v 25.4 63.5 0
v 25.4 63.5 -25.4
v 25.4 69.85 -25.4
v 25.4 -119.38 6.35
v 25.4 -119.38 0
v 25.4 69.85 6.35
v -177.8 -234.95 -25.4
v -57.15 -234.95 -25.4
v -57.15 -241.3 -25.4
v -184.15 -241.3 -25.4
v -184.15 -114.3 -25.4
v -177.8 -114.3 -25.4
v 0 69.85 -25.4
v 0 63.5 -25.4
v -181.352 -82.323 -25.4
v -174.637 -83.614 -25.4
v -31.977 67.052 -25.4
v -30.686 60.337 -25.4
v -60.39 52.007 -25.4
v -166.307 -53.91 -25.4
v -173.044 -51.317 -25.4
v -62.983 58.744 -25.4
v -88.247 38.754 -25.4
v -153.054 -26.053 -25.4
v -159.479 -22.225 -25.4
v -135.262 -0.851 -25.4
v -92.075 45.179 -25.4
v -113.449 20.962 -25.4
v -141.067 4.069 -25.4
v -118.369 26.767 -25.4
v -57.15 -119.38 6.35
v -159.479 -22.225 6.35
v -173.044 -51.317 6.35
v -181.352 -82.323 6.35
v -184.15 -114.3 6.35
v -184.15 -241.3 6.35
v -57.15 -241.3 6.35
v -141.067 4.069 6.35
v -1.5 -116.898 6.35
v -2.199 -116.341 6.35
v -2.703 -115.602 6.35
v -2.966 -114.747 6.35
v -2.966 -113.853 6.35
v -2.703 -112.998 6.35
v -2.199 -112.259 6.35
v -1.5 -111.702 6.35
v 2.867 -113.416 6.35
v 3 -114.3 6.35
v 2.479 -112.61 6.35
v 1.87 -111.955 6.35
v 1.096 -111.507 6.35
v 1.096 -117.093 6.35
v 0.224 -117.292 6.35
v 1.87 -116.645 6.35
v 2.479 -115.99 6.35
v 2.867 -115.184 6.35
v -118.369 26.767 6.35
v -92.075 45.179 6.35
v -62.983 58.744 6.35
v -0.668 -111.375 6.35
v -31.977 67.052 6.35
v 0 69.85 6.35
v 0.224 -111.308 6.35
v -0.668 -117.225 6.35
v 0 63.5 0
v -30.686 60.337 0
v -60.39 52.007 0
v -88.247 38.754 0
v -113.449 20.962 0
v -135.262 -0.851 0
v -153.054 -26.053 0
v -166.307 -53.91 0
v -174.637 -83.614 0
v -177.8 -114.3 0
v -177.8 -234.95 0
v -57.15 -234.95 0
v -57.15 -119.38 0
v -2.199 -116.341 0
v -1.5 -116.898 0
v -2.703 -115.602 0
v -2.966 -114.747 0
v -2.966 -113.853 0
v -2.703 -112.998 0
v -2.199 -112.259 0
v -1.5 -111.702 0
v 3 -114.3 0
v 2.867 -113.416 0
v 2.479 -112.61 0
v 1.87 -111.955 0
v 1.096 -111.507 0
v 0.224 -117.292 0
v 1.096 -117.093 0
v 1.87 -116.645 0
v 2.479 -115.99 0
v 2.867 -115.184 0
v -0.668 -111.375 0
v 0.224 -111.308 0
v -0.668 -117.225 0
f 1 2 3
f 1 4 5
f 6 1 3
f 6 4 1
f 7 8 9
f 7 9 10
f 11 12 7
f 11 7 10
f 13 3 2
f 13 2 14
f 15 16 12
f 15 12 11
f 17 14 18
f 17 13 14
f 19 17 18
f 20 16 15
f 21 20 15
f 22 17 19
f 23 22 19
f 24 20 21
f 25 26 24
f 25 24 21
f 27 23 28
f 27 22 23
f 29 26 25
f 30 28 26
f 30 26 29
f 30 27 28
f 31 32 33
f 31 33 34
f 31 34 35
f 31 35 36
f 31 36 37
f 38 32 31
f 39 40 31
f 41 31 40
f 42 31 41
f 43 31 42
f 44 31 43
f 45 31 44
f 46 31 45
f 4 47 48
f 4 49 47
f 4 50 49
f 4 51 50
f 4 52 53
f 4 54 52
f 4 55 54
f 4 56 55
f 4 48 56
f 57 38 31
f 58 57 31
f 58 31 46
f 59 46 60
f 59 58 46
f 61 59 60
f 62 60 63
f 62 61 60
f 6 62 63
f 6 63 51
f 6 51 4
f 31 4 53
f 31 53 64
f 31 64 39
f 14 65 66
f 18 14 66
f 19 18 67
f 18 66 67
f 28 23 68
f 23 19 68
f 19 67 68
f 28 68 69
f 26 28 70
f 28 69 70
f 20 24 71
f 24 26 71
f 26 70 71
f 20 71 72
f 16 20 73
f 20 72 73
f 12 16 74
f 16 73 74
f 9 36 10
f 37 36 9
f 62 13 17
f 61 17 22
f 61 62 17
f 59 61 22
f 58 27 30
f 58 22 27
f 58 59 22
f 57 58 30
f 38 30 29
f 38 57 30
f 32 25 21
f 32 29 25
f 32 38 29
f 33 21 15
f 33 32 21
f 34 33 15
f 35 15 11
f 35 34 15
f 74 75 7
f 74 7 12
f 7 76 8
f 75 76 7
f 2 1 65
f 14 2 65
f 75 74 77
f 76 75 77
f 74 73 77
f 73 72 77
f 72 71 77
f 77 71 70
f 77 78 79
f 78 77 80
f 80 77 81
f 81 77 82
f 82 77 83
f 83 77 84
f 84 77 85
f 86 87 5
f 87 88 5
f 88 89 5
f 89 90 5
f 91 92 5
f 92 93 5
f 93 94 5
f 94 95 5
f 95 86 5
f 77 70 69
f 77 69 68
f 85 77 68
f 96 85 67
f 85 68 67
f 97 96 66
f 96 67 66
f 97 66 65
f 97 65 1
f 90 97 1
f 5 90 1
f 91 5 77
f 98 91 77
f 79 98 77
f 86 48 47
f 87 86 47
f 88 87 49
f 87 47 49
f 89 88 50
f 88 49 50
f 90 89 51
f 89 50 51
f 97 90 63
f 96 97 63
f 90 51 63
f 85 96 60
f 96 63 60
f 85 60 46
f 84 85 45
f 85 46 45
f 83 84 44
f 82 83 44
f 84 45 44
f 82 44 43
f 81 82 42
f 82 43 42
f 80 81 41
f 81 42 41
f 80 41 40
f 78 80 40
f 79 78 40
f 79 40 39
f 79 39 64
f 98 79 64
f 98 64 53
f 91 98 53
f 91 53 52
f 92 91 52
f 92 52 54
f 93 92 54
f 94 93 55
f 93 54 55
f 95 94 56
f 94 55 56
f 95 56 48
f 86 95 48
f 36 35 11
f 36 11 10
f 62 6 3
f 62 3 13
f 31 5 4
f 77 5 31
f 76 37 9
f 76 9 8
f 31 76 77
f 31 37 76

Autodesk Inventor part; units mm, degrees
ref_plane "YZ Plane" through (0, 0, 0) normal (1, 0, 0) x (0, 1, 0)
ref_plane "XZ Plane" through (0, 0, 0) normal (0, 1, 0) x (-1, 0, 0)
ref_plane "XY Plane" through (0, 0, 0) normal (0, 0, 1) x (1, 0, 0)
ref_plane "Work Plane1" through (0, 0, 0) normal (0, 0, 1) x (1, 0, 0)
sketch "Sketch1" plane through (0, 0, 0) normal (0, 0, 1) x (1, 0, 0)
  circle A0 centre (0, -114.3) radius 4 construction
  line L0 (0, -114.3) -> (-57.15, -114.3) construction
  line L1 (0, -114.3) -> (0, 63.5) construction
  line L2 (25.4, 69.85) -> (0, 69.85)
  arc A1 (0, 69.85) -> (-184.15, -114.3) centre (0, -114.3) ccw
  line L3 (25.4, 69.85) -> (25.4, -114.3)
  line L4 (-184.15, -114.3) -> (-184.15, -241.3)
  line L5 (-184.15, -241.3) -> (-57.15, -241.3)
  line L6 (-57.15, -241.3) -> (-57.15, -119.38)
  line L7 (-57.15, -114.3) -> (-177.8, -114.3) construction
  line L8 (25.4, -114.3) -> (25.4, -119.38)
  line L9 (25.4, -119.38) -> (-57.15, -119.38)
  circle A2 centre (0, -114.3) radius 4
  point P0 (0, 0)
  dimension "d1" = 90
  dimension "d4" = 25.4
  dimension "d5" = 184.15
  dimension "d6" = 127
  dimension "d7" = 127
  dimension "d16" = 5.08
extrude "Extrusion1" add sketch "Sketch1" along normal blind 6.35 contours L3 L8 L9 L6 L5 L4 A1 L2 | A2
sketch "Sketch2" plane through (0, 0, 0) normal (0, 0, -1) x (-1, 0, 0)
  arc A0 (184.15, -114.3) -> (0, 69.85) centre (0, -114.3) ccw projected
  line L0 (-25.4, 69.85) -> (0, 69.85) construction
  arc A1 (184.15, -114.3) -> (0, 69.85) centre (0, -114.3) ccw construction
  line L1 (-25.4, -119.38) -> (-25.4, 69.85) construction
  line L2 (0, 69.85) -> (-25.4, 69.85) construction
  line L3 (-25.4, 69.85) -> (-25.4, 63.5) construction
  line L4 (-25.4, 63.5) -> (0, 63.5)
  line L5 (0, 63.5) -> (-25.4, 63.5) construction
  line L6 (-25.4, 69.85) -> (0, 69.85) projected
  line L7 (-25.4, 63.5) -> (-25.4, 69.85)
  line L8 (-25.4, 69.85) -> (0, 69.85)
  arc A2 (177.8, -114.3) -> (0, 63.5) centre (-3.1476, -117.4476) ccw
  line L9 (184.15, -114.3) -> (184.15, -241.3) projected
  line L10 (184.15, -114.3) -> (184.15, -241.3)
  line L11 (184.15, -241.3) -> (57.15, -241.3) projected
  line L12 (184.15, -241.3) -> (57.15, -241.3)
  line L13 (57.15, -241.3) -> (57.15, -234.95)
  line L14 (57.15, -241.3) -> (57.15, -119.38) projected
  line L15 (57.15, -234.95) -> (177.8, -234.95)
  line L16 (177.8, -234.95) -> (177.8, -114.3)
  point P0 (0, 0)
  point P1 (-25.4, -114.3)
  point P2 (57.15, -114.3)
  dimension "d10" = 6.35
  dimension "d11" = 6.35
  dimension "d12" = 180.975
  dimension "d13" = 6.35
extrude "Extrusion2" add sketch "Sketch2" along normal blind 25.4
sketch "Sketch3" plane through (0, 0, 6.35) normal (0, 0, 1) x (1, 0, 0)
  arc A0 (-2.982, -113.9716) -> (-0.8571, -111.4251) centre (0, -114.3) ccw construction
  circle A1 centre (0, -114.3) radius 3
  point P0 (0, 0)
extrude "Extrusion3" cut sketch "Sketch3" against normal through all
properties part number "Ring Shooter guide"
